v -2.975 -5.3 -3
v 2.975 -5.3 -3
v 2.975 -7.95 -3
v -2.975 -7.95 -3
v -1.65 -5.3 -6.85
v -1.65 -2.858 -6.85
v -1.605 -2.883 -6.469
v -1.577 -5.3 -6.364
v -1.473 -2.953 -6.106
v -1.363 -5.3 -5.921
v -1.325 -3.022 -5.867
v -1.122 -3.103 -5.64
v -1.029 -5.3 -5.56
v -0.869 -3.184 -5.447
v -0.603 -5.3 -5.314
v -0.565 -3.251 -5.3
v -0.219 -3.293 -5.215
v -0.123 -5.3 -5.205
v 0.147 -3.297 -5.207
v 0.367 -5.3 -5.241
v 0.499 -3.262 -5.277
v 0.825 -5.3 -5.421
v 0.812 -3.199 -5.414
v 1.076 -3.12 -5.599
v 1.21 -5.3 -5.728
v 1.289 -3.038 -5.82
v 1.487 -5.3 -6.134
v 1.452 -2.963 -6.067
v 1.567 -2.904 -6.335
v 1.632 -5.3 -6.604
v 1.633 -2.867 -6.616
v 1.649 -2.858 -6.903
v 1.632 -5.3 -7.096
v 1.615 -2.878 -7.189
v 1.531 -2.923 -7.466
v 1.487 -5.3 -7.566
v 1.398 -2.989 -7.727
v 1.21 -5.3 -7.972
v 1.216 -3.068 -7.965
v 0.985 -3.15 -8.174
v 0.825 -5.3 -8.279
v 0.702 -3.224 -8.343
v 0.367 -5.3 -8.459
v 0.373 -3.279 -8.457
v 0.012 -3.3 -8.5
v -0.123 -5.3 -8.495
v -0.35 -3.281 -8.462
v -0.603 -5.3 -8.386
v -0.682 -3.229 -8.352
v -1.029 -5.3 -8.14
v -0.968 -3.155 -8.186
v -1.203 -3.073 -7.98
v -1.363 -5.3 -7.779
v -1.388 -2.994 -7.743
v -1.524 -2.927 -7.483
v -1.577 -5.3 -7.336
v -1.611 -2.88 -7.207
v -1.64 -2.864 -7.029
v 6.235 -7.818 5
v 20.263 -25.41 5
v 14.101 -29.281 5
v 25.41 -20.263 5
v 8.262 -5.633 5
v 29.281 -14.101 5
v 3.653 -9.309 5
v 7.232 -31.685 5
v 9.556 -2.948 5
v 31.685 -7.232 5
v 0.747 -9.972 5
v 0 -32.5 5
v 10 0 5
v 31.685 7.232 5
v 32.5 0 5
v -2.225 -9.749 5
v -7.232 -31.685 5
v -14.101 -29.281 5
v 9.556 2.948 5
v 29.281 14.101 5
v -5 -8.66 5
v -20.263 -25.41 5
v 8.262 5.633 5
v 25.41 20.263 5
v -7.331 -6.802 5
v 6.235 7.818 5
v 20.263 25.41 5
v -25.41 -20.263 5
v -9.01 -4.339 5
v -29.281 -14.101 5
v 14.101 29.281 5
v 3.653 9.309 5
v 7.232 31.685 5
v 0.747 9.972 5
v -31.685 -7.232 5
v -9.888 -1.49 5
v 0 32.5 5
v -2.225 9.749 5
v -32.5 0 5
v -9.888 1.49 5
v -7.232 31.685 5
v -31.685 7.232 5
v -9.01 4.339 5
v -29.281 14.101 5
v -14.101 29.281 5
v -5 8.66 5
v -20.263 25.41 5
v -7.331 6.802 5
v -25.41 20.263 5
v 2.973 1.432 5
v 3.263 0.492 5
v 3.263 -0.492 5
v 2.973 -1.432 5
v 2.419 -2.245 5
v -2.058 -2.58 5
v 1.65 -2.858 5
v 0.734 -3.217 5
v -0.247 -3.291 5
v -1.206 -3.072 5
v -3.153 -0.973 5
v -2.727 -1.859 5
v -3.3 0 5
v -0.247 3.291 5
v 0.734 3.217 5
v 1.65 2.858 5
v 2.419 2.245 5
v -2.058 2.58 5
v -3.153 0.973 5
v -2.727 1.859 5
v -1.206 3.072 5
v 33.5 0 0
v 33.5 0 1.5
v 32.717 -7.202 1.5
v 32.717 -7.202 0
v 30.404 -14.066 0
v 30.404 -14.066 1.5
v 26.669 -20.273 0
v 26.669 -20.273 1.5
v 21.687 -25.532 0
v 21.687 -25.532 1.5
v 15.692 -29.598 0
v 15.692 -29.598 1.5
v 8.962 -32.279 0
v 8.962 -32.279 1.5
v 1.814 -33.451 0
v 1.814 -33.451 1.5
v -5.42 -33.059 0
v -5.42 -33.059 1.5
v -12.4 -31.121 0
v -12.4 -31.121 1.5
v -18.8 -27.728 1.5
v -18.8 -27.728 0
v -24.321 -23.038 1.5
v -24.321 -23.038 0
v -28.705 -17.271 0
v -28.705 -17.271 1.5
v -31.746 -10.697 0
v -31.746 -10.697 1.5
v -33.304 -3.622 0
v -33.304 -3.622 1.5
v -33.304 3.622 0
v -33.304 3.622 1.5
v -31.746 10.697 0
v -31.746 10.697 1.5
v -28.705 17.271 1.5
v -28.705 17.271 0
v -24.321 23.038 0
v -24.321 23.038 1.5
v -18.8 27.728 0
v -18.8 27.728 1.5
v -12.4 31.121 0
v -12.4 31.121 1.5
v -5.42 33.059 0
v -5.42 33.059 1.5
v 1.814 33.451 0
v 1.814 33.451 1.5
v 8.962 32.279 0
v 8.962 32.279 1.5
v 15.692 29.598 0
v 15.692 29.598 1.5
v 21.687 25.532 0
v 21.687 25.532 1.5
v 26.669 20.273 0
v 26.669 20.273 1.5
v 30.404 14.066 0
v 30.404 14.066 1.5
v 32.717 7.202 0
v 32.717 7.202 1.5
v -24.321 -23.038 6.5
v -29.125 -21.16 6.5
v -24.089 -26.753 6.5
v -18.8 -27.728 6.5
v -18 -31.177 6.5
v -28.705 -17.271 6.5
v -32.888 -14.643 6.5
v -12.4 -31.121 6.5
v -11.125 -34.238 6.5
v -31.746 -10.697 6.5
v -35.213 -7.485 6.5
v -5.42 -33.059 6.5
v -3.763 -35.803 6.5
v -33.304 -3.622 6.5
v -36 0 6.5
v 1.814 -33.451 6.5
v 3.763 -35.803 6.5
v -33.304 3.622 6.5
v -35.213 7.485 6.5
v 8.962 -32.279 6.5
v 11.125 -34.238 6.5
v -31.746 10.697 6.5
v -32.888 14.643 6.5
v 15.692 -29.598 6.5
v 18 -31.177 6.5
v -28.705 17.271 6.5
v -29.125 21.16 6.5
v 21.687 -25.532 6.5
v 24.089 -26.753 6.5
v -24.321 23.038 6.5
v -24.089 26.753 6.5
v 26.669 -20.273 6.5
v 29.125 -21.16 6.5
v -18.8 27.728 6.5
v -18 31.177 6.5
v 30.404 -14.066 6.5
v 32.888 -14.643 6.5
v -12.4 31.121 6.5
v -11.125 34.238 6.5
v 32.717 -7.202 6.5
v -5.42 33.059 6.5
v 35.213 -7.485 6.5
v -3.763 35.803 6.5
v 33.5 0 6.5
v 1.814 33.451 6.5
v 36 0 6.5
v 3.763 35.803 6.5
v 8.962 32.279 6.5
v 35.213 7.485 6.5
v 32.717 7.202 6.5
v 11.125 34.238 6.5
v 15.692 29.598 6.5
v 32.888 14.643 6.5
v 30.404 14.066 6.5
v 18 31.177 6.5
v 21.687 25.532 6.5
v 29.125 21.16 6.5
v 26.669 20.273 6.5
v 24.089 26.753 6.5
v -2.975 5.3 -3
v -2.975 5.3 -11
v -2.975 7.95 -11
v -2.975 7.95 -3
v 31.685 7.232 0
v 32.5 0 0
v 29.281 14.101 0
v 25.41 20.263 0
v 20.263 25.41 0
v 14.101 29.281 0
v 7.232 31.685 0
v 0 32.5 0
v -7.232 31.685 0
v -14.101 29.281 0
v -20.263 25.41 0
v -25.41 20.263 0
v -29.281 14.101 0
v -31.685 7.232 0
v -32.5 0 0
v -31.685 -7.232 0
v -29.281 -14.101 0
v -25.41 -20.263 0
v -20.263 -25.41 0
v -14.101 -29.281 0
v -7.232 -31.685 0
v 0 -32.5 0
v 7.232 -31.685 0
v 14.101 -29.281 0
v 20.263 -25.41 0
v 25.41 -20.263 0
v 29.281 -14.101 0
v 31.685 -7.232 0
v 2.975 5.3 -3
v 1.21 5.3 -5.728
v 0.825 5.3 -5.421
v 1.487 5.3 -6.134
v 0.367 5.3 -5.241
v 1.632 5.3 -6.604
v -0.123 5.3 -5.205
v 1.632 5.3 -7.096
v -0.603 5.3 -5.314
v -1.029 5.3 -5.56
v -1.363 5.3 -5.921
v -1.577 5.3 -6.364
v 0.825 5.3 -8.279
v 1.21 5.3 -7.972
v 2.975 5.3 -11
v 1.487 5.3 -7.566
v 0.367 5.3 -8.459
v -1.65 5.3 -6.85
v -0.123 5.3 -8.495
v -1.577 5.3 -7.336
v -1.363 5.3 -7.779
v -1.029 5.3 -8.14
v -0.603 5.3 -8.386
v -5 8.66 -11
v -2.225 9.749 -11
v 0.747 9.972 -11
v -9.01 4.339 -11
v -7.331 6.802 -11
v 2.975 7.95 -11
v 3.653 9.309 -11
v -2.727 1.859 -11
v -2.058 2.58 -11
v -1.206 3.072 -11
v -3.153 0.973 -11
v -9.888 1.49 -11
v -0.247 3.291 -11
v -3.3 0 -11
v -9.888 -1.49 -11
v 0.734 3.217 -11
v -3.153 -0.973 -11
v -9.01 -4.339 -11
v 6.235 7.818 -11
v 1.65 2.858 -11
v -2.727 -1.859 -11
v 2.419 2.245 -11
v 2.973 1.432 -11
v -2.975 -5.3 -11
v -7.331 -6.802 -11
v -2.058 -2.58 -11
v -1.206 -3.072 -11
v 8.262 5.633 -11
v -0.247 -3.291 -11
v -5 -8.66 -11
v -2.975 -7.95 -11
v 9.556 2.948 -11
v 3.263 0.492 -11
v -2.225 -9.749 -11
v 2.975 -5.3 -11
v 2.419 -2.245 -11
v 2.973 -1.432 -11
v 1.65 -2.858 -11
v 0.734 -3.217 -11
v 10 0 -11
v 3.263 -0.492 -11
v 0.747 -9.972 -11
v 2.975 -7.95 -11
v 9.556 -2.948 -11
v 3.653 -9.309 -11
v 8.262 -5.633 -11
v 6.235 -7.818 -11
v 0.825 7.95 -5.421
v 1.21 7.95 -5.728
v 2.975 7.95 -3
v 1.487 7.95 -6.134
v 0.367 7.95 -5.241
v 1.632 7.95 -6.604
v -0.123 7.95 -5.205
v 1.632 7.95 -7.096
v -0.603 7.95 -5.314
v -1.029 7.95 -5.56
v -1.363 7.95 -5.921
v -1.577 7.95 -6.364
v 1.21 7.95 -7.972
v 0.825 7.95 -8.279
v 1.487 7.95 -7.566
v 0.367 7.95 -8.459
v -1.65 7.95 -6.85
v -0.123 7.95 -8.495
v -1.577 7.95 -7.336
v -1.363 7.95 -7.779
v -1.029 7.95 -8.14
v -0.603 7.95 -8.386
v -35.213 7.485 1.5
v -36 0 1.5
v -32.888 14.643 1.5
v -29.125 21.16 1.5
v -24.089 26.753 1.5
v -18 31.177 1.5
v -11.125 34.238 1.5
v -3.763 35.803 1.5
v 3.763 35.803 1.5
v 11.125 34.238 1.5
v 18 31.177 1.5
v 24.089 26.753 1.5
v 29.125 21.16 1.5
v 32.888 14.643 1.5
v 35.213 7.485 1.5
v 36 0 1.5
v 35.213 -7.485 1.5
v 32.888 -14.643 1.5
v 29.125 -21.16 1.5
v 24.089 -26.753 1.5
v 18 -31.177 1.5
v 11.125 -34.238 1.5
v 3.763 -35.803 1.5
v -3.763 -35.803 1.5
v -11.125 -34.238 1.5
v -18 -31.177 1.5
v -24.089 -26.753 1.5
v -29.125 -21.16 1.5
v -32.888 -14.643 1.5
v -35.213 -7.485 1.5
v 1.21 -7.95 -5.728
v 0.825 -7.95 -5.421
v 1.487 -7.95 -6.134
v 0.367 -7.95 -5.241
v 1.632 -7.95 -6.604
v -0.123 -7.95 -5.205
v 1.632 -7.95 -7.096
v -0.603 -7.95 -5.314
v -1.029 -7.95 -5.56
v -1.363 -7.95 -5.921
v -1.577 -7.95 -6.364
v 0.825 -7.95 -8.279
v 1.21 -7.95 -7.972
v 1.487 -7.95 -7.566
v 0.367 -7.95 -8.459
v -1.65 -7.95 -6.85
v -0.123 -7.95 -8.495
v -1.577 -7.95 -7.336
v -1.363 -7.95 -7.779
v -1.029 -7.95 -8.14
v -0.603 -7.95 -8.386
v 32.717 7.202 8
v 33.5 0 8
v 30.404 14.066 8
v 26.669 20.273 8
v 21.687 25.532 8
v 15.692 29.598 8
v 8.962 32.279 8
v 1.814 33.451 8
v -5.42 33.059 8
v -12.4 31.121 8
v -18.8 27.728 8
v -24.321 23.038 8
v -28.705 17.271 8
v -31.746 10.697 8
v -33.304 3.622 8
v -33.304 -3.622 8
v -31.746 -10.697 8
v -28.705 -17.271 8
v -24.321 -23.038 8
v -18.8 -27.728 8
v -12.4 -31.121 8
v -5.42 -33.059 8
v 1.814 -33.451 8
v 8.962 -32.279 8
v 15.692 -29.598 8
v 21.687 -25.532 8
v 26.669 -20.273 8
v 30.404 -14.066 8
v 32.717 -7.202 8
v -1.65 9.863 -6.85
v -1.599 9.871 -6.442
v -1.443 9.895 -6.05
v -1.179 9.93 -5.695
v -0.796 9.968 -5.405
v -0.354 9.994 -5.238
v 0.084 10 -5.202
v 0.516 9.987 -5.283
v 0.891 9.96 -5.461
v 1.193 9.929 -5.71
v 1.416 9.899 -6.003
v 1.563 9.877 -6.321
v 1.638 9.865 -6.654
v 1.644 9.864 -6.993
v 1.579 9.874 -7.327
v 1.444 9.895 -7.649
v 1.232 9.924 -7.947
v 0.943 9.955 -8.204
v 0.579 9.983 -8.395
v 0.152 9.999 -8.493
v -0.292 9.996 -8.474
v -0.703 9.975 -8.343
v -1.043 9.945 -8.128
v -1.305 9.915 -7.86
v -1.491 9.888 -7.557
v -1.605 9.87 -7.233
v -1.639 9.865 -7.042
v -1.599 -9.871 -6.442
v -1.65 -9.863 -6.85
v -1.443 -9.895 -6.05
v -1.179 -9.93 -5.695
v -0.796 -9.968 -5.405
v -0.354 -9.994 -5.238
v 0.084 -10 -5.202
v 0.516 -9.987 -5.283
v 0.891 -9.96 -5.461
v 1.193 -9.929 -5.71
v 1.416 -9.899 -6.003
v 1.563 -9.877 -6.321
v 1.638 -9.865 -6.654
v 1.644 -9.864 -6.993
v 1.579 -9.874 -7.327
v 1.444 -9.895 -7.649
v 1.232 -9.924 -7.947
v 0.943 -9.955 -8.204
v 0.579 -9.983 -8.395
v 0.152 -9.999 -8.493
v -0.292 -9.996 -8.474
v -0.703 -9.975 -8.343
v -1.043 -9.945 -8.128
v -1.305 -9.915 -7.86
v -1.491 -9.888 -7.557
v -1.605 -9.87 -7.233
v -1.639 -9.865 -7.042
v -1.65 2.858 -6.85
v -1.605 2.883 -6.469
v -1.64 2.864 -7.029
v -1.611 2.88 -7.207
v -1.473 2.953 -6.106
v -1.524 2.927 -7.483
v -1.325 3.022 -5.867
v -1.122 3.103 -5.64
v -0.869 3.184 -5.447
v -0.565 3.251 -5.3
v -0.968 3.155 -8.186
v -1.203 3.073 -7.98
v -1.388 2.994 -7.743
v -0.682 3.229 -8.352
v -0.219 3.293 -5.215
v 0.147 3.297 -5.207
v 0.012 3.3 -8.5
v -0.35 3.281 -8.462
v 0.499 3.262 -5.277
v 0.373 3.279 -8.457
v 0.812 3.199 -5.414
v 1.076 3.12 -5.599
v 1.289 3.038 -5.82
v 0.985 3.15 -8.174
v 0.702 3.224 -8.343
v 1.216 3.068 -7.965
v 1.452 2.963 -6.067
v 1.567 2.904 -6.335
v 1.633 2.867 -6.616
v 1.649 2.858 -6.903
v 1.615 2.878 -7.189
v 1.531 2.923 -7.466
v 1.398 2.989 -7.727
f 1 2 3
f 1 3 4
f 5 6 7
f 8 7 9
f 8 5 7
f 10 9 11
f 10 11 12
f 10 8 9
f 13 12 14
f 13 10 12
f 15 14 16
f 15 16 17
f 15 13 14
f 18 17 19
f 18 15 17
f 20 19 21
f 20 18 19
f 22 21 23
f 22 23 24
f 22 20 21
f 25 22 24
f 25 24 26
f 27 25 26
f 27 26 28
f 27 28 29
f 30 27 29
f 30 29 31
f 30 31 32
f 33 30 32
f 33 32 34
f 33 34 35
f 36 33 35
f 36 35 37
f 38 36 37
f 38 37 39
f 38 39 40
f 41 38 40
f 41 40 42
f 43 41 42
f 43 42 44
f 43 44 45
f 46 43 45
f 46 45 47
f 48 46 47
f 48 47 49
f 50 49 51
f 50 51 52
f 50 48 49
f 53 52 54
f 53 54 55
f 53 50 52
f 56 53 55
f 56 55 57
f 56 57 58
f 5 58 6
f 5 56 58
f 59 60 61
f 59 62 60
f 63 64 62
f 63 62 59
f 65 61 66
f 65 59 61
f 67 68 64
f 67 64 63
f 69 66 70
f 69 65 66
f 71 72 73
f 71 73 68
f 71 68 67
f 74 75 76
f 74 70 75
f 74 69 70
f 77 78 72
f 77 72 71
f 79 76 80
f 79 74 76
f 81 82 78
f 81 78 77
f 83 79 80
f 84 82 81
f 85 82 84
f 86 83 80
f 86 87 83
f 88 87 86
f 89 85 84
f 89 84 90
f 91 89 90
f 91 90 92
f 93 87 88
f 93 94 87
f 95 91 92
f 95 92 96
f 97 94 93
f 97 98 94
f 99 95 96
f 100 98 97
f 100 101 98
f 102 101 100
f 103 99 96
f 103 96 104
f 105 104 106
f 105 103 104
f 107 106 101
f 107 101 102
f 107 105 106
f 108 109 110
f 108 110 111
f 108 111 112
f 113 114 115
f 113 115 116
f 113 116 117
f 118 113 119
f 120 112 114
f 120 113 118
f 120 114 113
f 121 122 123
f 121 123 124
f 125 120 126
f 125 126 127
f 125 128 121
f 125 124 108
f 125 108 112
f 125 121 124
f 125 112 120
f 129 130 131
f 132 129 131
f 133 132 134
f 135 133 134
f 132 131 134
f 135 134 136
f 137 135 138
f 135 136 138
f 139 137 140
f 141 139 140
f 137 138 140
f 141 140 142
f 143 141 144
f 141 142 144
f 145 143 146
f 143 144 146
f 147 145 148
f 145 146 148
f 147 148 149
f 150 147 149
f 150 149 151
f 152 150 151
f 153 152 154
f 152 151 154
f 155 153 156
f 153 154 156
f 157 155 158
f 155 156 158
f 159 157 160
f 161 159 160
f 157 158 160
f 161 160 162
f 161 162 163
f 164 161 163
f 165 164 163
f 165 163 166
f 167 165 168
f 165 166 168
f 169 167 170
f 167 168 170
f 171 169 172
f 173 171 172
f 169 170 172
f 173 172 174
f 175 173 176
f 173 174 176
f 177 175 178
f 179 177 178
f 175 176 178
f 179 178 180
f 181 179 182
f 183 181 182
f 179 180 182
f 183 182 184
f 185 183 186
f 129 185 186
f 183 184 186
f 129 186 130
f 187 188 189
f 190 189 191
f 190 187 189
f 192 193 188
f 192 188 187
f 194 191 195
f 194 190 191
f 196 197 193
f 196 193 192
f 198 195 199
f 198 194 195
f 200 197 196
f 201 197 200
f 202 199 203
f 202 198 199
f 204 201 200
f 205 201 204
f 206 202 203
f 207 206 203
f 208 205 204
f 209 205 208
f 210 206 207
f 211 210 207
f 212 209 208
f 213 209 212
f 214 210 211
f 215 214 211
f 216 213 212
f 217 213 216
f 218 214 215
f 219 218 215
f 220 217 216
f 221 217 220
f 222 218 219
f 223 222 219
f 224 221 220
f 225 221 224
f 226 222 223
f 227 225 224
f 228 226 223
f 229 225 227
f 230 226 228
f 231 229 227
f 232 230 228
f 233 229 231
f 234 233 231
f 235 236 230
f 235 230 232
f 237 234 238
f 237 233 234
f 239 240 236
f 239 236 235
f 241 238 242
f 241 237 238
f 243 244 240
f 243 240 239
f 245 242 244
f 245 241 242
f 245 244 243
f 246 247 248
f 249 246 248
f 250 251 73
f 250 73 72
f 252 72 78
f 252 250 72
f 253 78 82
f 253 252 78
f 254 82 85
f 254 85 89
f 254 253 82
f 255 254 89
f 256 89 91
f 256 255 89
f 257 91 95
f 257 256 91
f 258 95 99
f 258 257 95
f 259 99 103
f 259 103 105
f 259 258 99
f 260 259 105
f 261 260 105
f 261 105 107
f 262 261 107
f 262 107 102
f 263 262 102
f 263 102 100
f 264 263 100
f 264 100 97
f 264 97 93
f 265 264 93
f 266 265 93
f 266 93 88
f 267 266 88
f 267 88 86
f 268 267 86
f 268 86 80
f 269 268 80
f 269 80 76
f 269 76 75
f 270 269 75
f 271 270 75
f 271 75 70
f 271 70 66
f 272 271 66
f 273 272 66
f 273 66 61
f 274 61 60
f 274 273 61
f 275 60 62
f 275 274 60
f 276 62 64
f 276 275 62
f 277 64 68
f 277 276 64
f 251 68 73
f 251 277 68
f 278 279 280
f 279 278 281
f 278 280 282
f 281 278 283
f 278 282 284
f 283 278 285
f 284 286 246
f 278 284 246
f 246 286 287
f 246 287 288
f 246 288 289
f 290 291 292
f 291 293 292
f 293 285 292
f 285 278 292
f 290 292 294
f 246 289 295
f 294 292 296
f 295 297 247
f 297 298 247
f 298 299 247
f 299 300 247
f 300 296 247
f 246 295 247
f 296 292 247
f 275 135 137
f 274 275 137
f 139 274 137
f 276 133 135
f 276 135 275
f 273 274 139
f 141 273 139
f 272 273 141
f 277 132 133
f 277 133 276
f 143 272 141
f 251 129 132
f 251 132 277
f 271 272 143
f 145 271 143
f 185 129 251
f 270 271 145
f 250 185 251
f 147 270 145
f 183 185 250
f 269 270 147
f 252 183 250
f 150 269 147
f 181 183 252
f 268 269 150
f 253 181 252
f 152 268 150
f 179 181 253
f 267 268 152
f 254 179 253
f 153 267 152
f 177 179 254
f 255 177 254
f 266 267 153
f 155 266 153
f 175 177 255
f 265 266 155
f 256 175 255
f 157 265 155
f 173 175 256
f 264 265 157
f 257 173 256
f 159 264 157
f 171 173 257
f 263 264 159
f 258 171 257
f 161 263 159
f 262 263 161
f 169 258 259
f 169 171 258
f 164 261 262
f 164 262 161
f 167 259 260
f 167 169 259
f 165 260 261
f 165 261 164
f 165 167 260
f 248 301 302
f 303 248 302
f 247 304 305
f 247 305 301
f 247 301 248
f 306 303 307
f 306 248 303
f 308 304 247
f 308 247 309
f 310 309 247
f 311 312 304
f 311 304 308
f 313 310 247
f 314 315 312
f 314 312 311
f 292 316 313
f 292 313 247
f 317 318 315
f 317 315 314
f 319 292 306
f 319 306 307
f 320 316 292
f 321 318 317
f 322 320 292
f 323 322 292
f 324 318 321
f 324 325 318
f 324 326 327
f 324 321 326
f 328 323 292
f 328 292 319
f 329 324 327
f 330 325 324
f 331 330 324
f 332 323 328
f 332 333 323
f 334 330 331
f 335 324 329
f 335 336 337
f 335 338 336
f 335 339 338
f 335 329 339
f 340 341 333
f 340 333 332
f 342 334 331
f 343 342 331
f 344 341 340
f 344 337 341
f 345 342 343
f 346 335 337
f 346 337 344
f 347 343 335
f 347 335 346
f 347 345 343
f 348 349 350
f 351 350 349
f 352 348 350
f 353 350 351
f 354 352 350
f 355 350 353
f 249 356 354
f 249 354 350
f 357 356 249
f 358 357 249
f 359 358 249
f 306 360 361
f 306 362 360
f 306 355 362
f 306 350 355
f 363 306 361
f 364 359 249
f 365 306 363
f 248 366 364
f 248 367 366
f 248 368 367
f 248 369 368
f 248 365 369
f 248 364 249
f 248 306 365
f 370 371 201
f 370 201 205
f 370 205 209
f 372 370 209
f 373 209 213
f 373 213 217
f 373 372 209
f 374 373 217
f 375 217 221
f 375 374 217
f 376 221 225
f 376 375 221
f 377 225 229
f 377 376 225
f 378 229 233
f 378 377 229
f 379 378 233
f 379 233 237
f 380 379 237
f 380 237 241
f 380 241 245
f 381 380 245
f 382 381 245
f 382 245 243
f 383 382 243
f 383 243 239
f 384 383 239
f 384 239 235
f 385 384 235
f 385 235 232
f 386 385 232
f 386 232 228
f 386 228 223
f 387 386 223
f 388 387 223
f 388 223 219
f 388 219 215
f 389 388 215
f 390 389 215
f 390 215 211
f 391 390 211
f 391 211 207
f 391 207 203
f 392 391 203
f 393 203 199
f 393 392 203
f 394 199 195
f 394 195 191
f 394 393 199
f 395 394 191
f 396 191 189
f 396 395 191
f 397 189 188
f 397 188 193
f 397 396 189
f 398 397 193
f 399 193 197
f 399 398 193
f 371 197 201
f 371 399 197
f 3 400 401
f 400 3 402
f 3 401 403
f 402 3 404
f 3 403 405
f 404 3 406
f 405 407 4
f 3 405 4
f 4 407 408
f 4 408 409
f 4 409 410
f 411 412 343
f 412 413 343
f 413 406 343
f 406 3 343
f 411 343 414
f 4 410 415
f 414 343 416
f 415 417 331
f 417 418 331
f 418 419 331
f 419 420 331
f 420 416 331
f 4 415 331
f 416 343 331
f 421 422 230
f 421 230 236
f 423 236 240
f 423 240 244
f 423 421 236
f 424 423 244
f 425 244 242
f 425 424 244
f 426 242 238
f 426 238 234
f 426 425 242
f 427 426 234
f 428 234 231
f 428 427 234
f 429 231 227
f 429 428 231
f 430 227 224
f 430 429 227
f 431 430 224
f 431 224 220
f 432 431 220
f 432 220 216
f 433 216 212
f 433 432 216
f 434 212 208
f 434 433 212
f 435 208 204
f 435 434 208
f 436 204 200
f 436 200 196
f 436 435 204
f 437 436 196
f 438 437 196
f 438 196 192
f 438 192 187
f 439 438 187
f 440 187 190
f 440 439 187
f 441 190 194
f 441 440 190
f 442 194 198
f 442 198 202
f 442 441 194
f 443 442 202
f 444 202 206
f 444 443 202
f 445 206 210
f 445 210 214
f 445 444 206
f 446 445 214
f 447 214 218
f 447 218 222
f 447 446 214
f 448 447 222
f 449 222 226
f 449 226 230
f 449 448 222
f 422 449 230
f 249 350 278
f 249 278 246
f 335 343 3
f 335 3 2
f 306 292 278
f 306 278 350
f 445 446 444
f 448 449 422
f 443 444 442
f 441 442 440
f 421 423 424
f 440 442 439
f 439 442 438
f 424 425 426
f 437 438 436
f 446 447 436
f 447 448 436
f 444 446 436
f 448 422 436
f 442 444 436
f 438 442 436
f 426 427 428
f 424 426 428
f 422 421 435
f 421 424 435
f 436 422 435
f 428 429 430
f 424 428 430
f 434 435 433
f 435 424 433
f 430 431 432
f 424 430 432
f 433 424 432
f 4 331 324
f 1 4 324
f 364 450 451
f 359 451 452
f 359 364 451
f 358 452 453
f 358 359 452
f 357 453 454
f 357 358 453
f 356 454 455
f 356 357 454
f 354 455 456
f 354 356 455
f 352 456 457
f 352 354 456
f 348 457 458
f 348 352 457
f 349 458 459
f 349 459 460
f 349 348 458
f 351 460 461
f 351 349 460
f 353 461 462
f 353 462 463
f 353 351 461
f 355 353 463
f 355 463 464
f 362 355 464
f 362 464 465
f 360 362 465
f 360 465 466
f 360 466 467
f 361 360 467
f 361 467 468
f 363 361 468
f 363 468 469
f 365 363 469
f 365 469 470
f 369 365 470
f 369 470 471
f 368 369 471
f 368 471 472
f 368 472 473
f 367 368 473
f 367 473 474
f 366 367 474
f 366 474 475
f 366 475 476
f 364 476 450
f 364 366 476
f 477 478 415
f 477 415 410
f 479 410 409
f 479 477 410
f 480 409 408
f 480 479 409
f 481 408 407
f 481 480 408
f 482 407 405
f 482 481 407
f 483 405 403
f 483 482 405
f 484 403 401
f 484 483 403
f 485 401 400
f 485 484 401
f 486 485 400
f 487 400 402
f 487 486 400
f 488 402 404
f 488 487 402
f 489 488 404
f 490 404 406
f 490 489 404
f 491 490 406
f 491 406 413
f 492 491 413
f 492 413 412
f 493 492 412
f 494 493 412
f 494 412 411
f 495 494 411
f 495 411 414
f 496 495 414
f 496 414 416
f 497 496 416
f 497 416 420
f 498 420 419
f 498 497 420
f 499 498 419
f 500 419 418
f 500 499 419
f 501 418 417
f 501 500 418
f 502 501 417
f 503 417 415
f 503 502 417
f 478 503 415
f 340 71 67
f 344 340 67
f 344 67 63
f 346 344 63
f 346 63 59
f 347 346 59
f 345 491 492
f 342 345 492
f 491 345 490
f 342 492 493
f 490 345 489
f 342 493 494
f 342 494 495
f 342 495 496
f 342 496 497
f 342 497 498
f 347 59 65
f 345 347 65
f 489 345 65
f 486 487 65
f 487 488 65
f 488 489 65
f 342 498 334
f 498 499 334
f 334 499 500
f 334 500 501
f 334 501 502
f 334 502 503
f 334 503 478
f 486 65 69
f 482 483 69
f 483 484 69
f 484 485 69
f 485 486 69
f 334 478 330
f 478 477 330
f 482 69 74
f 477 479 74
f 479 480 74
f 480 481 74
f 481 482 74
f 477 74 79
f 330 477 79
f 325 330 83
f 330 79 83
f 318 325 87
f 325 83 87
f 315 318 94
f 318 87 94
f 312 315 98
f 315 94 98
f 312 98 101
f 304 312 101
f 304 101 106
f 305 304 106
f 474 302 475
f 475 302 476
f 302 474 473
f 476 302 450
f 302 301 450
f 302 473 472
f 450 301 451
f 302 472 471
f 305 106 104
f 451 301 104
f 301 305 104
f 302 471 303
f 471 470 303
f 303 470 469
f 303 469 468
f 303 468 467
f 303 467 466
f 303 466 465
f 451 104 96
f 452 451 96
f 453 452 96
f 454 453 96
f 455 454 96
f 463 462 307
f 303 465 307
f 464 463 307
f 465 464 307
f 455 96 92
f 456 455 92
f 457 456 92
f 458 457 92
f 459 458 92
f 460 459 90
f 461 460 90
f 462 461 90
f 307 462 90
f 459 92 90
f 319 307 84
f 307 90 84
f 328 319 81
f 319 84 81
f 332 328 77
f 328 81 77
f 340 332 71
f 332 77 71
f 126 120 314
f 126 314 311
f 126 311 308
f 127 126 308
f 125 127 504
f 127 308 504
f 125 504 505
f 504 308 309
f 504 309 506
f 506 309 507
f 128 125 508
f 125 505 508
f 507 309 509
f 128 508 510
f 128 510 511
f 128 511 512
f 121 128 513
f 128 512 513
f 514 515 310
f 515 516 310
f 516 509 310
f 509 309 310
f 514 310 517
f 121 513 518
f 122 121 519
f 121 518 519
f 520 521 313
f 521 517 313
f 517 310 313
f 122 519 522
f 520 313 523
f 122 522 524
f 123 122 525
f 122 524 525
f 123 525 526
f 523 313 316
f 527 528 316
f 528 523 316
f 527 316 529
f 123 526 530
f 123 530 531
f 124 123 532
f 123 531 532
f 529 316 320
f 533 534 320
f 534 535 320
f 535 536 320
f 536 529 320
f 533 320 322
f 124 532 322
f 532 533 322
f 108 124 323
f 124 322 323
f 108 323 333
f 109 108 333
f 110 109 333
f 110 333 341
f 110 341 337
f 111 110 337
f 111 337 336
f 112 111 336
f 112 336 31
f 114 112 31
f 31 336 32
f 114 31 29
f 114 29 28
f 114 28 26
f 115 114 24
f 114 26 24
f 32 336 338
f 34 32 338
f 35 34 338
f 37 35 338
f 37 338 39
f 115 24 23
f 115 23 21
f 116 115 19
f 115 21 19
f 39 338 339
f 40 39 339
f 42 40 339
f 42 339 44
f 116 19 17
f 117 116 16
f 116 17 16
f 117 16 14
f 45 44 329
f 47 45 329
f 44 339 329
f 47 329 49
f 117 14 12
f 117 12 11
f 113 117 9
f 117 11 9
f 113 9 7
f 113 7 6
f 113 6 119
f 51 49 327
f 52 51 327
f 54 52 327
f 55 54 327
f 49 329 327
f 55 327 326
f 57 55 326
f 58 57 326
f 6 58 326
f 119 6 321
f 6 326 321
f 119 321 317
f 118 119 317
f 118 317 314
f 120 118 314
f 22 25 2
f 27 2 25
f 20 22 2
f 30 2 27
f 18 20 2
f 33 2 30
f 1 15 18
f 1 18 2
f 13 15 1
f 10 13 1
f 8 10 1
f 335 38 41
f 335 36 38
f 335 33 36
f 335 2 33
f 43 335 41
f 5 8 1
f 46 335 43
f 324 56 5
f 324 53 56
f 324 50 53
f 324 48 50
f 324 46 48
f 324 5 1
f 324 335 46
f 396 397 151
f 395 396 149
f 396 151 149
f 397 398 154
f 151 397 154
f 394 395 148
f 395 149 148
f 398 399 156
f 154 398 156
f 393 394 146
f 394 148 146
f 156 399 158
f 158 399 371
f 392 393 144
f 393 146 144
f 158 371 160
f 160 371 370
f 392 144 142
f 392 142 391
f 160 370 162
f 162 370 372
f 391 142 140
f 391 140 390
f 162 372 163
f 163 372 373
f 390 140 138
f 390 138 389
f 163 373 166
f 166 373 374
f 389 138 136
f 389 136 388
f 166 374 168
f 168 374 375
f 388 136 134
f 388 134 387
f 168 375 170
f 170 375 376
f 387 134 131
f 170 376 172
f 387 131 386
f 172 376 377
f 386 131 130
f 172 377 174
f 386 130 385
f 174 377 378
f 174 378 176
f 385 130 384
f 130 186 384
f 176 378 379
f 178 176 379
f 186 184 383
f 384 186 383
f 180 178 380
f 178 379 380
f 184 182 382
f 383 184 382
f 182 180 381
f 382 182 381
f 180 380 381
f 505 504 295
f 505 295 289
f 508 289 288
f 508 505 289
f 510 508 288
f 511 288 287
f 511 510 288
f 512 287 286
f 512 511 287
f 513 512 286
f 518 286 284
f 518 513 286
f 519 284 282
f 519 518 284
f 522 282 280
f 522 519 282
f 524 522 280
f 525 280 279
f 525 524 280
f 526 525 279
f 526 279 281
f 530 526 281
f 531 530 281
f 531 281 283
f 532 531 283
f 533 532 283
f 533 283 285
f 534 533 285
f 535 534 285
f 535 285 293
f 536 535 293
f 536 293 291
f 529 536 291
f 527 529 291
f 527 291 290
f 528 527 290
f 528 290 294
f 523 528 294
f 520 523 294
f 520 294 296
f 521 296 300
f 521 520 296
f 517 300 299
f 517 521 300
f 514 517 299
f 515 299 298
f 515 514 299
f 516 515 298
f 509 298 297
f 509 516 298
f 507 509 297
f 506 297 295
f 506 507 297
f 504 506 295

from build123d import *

# Parameters (mm, degrees)
ESBO_O1_R                     = 35
ESBO_O1_R_2                   = 32.5
RESSALTO_EXTRUS_O1_DEPTH      = 8
RESSALTO_EXTRUS_O2_START      = -3
ESBO_O2_R                     = 32.5
RESSALTO_EXTRUS_O2_DEPTH      = 3
ESBO_O3_R                     = 2.5
CORTE_EXTRUS_O1_DEPTH         = 3
RESSALTO_EXTRUS_O3_DEPTH      = 5
RESSALTO_EXTRUS_O3_DEPTH_BACK = 3
ESBO_O4_R                     = 37
ESBO_O4_R_2                   = 35
ESBO_O5_W                     = 1.8
ESBO_O5_H                     = 3
ESBO_O6_R                     = 12.55
RESSALTO_EXTRUS_O4_DEPTH      = 5
CORTE_EXTRUS_O2_DEPTH         = 53.933921071
CORTE_EXTRUS_O2_DEPTH_BACK    = 53.933921071
ESBO_O7_R                     = 7.55
RESSALTO_EXTRUS_O5_START      = -8
ESBO_O8_R                     = 37
ESBO_O8_R_2                   = 32.5
RESSALTO_EXTRUS_O5_DEPTH      = 8
ESBO_O9_R                     = 37
ESBO_O9_R_2                   = 33.5
CORTE_EXTRUS_O8_DEPTH         = 1.5
CORTE_EXTRUS_O9_START         = -1.5
ESBO_O12_R                    = 37
ESBO_O12_R_2                  = 33.5
CORTE_EXTRUS_O9_DEPTH         = 1.5
CORTE_EXTRUS_O10_START        = -10
ESBO_O13_R                    = 37
ESBO_O13_R_2                  = 36
CORTE_EXTRUS_O10_DEPTH        = 10
ESBO_O14_R                    = 37
ESBO_O14_R_2                  = 36
RESSALTO_EXTRUS_O6_DEPTH      = 5
ESBO_O15_R                    = 12.55
CORTE_EXTRUS_O11_DEPTH        = 53.933921071
ESBO_O16_R                    = 12.55
RESSALTO_EXTRUS_O7_DEPTH      = 3
ESBO_O17_R                    = 10
RESSALTO_EXTRUS_O8_DEPTH      = 16
ESBO_O18_R                    = 3.3
CORTE_EXTRUS_O12_DEPTH        = 16
ESBO_O19_W                    = 5.95
ESBO_O19_H                    = 2.65
CORTE_EXTRUS_O13_DEPTH        = 8
CORTE_EXTRUS_O14_DEPTH        = 58.265085349
CORTE_EXTRUS_O14_DEPTH_BACK   = 58.265085349
ESBO_O21_R                    = 1.65
ESBO_O23_R                    = 37
ESBO_O23_R_2                  = 36
CORTE_EXTRUS_O15_DEPTH        = 54.798234195


with BuildPart() as part:
    # Esboço1 → Ressalto-extrusão1 (new body)
    with BuildSketch(Plane.XY):
        Circle(ESBO_O1_R)
        Circle(ESBO_O1_R_2, mode=Mode.SUBTRACT)
    extrude(amount=RESSALTO_EXTRUS_O1_DEPTH)

    # Esboço2 → Ressalto-extrusão2 (add)
    with BuildSketch(Plane.XY.offset(8).offset(RESSALTO_EXTRUS_O2_START)):
        Circle(ESBO_O2_R)
    extrude(amount=RESSALTO_EXTRUS_O2_DEPTH)

    # Esboço3 → Corte-extrusão1 (cut)
    with BuildSketch(Plane.XY.offset(8)):
        Circle(ESBO_O3_R)
    extrude(amount=-CORTE_EXTRUS_O1_DEPTH, mode=Mode.SUBTRACT)

    # Esboço4 → Ressalto-extrusão3 (add, two sides: drawn at the far end of the back side and taken through both)
    with BuildSketch(Plane(origin=(0, 0, 5), x_dir=(-1, 0, 0), z_dir=(0, 0, -1)).offset(-RESSALTO_EXTRUS_O3_DEPTH_BACK)):
        Circle(ESBO_O4_R)
        Circle(ESBO_O4_R_2, mode=Mode.SUBTRACT)
    extrude(amount=RESSALTO_EXTRUS_O3_DEPTH + RESSALTO_EXTRUS_O3_DEPTH_BACK)

    # Esboço5 → Corte-Revolução1 (revolve, cut)
    with BuildSketch(Plane(origin=(0, 0, 0), x_dir=(1, 0, 0), z_dir=(0, 1, 0))):
        with Locations((-36.1, -2.5)):
            Rectangle(ESBO_O5_W, ESBO_O5_H)
        with Locations((-36.1, -5.5)):
            Rectangle(ESBO_O5_W, ESBO_O5_H)
    revolve(axis=Axis((0, 0, 8), (0, 0, -1)), mode=Mode.SUBTRACT)

    # Esboço6 → Ressalto-extrusão4 (add)
    with BuildSketch(Plane(origin=(0, 0, 5), x_dir=(-1, 0, 0), z_dir=(0, 0, -1))):
        with Locations(Location((0, 0, 0), (0, 0, 180))):
            Circle(ESBO_O6_R)
    extrude(amount=RESSALTO_EXTRUS_O4_DEPTH)

    # Esboço7 → Corte-extrusão2 (cut, two sides: drawn at the far end of the back side and taken through both)
    with BuildSketch(Plane(origin=(0, 0, 0), x_dir=(-1, 0, 0), z_dir=(0, 0, -1)).offset(-CORTE_EXTRUS_O2_DEPTH_BACK)):
        Circle(ESBO_O7_R)
    extrude(amount=CORTE_EXTRUS_O2_DEPTH + CORTE_EXTRUS_O2_DEPTH_BACK, mode=Mode.SUBTRACT)

    # Esboço8 → Ressalto-extrusão5 (add)
    with BuildSketch(Plane.XY.offset(8).offset(RESSALTO_EXTRUS_O5_START)):
        with Locations(Location((0, 0, 0), (0, 0, 180))):
            Circle(ESBO_O8_R)
        Circle(ESBO_O8_R_2, mode=Mode.SUBTRACT)
    extrude(amount=RESSALTO_EXTRUS_O5_DEPTH)

    # Esboço9 → Corte-extrusão8 (cut)
    with BuildSketch(Plane.XY.offset(8)):
        with Locations(Location((0, 0, 0), (0, 0, 180))):
            Circle(ESBO_O9_R)
        Circle(ESBO_O9_R_2, mode=Mode.SUBTRACT)
    extrude(amount=-CORTE_EXTRUS_O8_DEPTH, mode=Mode.SUBTRACT)

    # Esboço12 → Corte-extrusão9 (cut)
    with BuildSketch(Plane(origin=(0, 0, 0), x_dir=(-1, 0, 0), z_dir=(0, 0, -1)).offset(CORTE_EXTRUS_O9_START)):
        Circle(ESBO_O12_R)
        with Locations(Location((0, 0, 0), (0, 0, 180))):
            Circle(ESBO_O12_R_2, mode=Mode.SUBTRACT)
    extrude(amount=CORTE_EXTRUS_O9_DEPTH, mode=Mode.SUBTRACT)

    # Esboço13 → Corte-extrusão10 (cut)
    with BuildSketch(Plane(origin=(0, 0, 1.5), x_dir=(-1, 0, 0), z_dir=(0, 0, -1)).offset(CORTE_EXTRUS_O10_START)):
        Circle(ESBO_O13_R)
        Circle(ESBO_O13_R_2, mode=Mode.SUBTRACT)
    extrude(amount=CORTE_EXTRUS_O10_DEPTH, mode=Mode.SUBTRACT)

    # Esboço14 → Ressalto-extrusão6 (add)
    with BuildSketch(Plane.XY.offset(6.5)):
        Circle(ESBO_O14_R)
        Circle(ESBO_O14_R_2, mode=Mode.SUBTRACT)
    extrude(amount=-RESSALTO_EXTRUS_O6_DEPTH)

    # Esboço15 → Corte-extrusão11 (cut, through all)
    with BuildSketch(Plane(origin=(0, 0, 0), x_dir=(-1, 0, 0), z_dir=(0, 0, -1))):
        Circle(ESBO_O15_R)
    extrude(amount=-CORTE_EXTRUS_O11_DEPTH, mode=Mode.SUBTRACT)

    # Esboço16 → Ressalto-extrusão7 (add, through all)
    with BuildSketch(Plane(origin=(0, 0, 5), x_dir=(-1, 0, 0), z_dir=(0, 0, -1))):
        Circle(ESBO_O16_R)
    extrude(amount=-RESSALTO_EXTRUS_O7_DEPTH)

    # Esboço17 → Ressalto-extrusão8 (add)
    with BuildSketch(Plane(origin=(0, 0, 5), x_dir=(-1, 0, 0), z_dir=(0, 0, -1))):
        with Locations(Location((0, 0, 0), (0, 0, 180))):
            Circle(ESBO_O17_R)
    extrude(amount=RESSALTO_EXTRUS_O8_DEPTH)

    # Esboço18 → Corte-extrusão12 (cut)
    with BuildSketch(Plane(origin=(0, 0, -11), x_dir=(-1, 0, 0), z_dir=(0, 0, -1))):
        Circle(ESBO_O18_R)
    extrude(amount=-CORTE_EXTRUS_O12_DEPTH, mode=Mode.SUBTRACT)

    # Esboço19 → Corte-extrusão13 (cut)
    with BuildSketch(Plane(origin=(0, 0, -11), x_dir=(-1, 0, 0), z_dir=(0, 0, -1))):
        with Locations((0, -6.625)):
            Rectangle(ESBO_O19_W, ESBO_O19_H)
        with Locations((0, 6.625)):
            Rectangle(ESBO_O19_W, ESBO_O19_H)
    extrude(amount=-CORTE_EXTRUS_O13_DEPTH, mode=Mode.SUBTRACT)

    # Esboço21 → Corte-extrusão14 (cut, two sides: drawn at the far end of the back side and taken through both)
    with BuildSketch(Plane(origin=(0, 5.3, 0), x_dir=(1, 0, 0), z_dir=(0, 1, 0)).offset(-CORTE_EXTRUS_O14_DEPTH_BACK)):
        with Locations(Location((0, 6.85, 0), (0, 0, 180))):
            Circle(ESBO_O21_R)
    extrude(amount=CORTE_EXTRUS_O14_DEPTH + CORTE_EXTRUS_O14_DEPTH_BACK, mode=Mode.SUBTRACT)

    # Esboço23 → Corte-extrusão15 (cut, through all)
    with BuildSketch(Plane(origin=(0, 0, 1.5), x_dir=(-1, 0, 0), z_dir=(0, 0, -1))):
        Circle(ESBO_O23_R)
        Circle(ESBO_O23_R_2, mode=Mode.SUBTRACT)
    extrude(amount=-CORTE_EXTRUS_O15_DEPTH, mode=Mode.SUBTRACT)


solid = part.part
